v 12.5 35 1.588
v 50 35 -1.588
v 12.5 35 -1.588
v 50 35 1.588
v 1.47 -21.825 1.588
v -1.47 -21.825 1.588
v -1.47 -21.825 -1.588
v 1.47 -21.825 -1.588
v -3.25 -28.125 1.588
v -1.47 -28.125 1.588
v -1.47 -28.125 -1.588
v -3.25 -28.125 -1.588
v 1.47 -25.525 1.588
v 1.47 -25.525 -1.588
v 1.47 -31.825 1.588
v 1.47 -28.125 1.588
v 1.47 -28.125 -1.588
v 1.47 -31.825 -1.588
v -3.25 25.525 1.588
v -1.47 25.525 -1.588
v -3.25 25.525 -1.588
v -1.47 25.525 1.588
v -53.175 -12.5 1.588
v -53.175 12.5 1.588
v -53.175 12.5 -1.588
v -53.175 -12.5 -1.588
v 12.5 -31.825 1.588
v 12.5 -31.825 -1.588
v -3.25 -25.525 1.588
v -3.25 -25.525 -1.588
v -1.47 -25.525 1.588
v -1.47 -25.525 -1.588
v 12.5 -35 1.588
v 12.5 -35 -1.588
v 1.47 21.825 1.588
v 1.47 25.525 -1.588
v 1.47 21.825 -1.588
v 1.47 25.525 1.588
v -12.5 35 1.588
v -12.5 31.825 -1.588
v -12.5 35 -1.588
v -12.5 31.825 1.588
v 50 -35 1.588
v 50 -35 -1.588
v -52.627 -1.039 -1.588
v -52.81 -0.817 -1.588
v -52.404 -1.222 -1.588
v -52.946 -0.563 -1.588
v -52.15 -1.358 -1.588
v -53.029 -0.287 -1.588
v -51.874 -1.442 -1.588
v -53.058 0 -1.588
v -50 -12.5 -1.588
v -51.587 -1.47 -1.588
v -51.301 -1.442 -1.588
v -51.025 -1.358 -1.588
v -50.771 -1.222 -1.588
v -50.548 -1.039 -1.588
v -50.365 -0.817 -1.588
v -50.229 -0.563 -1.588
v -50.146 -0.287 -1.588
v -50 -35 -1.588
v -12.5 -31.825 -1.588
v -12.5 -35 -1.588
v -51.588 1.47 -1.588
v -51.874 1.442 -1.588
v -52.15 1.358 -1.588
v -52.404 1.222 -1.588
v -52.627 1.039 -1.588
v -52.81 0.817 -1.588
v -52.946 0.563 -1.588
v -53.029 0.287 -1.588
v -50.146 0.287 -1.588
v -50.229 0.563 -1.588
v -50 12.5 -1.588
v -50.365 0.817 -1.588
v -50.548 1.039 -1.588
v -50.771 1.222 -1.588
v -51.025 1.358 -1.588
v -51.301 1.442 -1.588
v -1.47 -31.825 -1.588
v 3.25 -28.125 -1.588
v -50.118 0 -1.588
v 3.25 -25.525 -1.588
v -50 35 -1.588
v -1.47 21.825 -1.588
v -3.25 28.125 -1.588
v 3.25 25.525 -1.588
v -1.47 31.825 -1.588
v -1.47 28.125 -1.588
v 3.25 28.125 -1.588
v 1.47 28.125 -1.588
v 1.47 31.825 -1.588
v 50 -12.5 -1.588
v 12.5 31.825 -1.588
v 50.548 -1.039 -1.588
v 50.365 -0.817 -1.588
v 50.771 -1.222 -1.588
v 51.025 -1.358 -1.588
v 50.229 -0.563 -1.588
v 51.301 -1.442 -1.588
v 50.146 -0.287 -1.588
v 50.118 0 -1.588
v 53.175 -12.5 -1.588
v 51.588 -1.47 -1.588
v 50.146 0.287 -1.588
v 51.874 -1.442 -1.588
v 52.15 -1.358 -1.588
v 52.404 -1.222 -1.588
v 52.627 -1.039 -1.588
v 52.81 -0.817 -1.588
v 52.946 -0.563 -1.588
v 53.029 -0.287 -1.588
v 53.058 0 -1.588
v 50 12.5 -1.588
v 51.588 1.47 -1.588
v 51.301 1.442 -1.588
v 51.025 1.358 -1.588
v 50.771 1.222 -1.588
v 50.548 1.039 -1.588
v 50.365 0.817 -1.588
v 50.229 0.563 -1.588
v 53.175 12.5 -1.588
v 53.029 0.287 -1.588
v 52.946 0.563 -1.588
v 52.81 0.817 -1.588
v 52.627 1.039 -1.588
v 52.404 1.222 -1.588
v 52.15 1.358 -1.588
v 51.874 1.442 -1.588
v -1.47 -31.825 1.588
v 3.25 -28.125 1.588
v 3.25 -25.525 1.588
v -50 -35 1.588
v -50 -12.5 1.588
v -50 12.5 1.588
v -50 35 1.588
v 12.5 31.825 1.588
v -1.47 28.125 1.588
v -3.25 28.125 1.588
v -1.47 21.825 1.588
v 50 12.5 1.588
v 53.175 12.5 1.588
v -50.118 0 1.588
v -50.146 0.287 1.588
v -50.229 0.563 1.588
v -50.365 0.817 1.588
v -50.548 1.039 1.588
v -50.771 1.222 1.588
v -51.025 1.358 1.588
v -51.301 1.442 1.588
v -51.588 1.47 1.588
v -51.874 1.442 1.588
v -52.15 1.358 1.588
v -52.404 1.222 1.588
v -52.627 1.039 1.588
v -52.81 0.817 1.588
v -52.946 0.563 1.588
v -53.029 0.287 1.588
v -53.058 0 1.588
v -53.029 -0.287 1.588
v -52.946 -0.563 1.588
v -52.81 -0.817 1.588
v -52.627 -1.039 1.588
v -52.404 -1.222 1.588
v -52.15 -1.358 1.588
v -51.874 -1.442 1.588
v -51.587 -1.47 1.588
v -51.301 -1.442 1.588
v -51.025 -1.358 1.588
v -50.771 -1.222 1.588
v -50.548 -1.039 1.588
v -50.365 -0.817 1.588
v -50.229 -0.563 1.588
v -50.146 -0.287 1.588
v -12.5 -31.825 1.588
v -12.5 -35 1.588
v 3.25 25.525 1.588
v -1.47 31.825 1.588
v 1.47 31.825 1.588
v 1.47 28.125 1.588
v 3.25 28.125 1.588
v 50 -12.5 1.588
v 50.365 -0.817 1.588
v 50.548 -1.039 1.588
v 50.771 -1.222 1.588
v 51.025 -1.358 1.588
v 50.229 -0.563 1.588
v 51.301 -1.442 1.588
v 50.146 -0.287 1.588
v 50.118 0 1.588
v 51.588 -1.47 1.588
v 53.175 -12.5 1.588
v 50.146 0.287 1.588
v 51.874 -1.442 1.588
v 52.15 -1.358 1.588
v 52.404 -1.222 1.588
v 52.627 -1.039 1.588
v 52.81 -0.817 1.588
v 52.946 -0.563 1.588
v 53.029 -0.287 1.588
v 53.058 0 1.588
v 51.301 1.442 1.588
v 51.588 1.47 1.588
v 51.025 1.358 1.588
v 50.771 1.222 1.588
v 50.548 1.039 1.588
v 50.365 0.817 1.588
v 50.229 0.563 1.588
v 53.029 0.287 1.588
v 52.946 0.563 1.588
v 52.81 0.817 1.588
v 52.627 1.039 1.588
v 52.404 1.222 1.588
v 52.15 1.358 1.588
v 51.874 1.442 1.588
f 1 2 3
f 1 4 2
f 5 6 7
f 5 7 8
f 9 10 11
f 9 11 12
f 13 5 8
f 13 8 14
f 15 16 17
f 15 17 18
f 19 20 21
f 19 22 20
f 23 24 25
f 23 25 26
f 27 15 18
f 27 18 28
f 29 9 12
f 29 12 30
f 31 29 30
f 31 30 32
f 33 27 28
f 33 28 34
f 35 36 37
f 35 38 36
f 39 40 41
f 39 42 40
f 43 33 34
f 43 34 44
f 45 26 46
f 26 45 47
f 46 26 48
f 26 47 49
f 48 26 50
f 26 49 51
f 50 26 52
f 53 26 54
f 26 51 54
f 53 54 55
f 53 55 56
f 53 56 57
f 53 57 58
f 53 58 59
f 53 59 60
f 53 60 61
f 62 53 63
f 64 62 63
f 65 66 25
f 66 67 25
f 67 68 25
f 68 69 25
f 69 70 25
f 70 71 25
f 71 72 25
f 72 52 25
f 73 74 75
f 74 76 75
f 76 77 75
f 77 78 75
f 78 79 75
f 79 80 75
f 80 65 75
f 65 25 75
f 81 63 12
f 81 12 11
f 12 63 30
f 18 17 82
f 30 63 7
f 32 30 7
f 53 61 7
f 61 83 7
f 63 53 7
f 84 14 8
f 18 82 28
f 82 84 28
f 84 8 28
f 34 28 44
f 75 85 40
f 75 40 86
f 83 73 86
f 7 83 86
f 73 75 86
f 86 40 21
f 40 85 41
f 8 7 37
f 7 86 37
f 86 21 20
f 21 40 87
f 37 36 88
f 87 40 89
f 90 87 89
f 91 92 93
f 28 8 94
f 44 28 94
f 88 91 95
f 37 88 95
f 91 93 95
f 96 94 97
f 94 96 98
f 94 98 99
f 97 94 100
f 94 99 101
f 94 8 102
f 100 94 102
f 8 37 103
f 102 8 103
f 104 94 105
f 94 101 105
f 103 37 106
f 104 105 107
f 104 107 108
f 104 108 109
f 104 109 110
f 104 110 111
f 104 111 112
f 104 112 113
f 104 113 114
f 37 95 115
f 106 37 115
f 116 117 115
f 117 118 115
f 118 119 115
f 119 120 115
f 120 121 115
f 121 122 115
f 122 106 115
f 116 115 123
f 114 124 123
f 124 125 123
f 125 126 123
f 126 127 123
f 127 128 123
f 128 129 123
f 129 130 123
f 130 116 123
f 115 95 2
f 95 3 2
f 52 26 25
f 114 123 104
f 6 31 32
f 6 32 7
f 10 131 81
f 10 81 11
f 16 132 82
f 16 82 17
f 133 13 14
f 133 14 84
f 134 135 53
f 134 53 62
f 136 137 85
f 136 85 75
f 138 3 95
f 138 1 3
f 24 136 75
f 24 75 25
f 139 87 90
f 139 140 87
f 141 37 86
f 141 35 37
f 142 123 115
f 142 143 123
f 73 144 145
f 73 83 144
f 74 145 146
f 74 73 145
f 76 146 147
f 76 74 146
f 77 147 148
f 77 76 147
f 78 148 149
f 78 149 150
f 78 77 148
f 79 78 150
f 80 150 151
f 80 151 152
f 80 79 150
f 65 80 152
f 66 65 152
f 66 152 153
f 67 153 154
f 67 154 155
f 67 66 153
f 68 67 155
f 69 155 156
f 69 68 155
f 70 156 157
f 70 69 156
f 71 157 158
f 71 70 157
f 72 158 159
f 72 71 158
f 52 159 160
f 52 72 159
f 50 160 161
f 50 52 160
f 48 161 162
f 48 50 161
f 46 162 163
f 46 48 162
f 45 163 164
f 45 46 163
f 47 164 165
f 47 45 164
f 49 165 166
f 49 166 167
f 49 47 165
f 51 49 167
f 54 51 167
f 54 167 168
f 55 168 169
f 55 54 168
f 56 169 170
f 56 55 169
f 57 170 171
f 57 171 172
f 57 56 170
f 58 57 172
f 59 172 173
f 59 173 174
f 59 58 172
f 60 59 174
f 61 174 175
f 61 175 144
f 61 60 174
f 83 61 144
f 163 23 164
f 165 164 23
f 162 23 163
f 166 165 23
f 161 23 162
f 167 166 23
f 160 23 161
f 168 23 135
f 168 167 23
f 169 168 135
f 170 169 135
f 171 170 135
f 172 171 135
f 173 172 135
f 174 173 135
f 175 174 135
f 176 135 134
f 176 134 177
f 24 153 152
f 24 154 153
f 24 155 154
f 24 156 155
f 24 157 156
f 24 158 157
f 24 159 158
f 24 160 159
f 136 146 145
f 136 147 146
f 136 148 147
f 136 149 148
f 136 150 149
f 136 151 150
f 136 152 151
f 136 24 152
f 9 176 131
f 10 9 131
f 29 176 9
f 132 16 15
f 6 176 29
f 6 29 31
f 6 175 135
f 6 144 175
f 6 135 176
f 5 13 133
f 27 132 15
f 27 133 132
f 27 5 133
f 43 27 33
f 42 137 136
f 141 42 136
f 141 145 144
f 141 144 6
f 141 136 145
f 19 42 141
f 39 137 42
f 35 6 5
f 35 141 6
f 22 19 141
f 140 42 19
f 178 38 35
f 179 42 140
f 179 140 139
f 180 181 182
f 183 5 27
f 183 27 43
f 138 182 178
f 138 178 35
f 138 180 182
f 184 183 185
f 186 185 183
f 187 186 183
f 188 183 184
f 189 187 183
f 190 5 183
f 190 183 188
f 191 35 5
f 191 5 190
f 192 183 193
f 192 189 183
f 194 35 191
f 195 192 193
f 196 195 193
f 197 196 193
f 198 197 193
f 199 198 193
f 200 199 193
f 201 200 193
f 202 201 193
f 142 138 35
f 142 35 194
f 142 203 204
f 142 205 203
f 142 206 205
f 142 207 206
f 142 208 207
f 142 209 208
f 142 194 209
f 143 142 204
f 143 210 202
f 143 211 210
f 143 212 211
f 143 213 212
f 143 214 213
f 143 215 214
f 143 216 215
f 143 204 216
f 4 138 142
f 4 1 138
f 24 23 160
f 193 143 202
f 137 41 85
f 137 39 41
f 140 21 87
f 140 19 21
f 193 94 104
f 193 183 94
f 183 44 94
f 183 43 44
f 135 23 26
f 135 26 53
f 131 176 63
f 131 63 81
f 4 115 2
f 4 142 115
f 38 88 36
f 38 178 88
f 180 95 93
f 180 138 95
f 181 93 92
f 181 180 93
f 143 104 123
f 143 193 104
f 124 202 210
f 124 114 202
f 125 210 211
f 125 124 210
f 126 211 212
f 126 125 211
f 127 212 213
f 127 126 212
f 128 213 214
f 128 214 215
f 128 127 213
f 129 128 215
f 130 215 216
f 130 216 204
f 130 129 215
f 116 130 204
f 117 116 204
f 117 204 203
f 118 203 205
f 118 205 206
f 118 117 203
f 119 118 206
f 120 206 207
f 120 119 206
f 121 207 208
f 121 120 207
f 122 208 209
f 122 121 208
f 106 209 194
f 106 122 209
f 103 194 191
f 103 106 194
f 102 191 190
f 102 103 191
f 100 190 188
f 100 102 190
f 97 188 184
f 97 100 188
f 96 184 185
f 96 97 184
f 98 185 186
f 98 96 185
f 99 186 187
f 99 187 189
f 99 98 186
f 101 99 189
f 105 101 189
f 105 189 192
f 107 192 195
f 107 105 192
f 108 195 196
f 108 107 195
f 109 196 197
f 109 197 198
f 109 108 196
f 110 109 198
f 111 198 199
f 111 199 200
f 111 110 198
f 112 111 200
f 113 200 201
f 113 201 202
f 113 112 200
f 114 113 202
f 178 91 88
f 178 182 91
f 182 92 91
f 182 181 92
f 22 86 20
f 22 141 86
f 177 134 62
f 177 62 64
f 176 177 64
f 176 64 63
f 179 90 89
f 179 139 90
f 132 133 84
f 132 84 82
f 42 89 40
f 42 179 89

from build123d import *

# Parameters (mm, degrees)
SKETCH1_R           = 1.47
BOSS_EXTRUDE1_DEPTH = 1.5875


with BuildPart() as part:
    # Sketch1 → Boss-Extrude1 (new body, symmetric)
    with BuildSketch(Plane.XY):
        Polygon((-12.5, 35), (-50, 35), (-50, 12.5), (-53.175, 12.5), (-53.175, -12.5), (-50, -12.5), (-50, -35), (-12.5, -35), (-12.5, -31.825), (-1.47, -31.825), (-1.47, -28.125), (-3.25, -28.125), (-3.25, -25.525), (-1.47, -25.525), (-1.47, -21.825), (1.47, -21.825), (1.47, -25.525), (3.25, -25.525), (3.25, -28.125), (1.47, -28.125), (1.47, -31.825), (12.5, -31.825), (12.5, -35), (50, -35), (50, -12.5), (53.175, -12.5), (53.175, 12.5), (50, 12.5), (50, 35), (12.5, 35), (12.5, 31.825), (1.47, 31.825), (1.47, 28.125), (3.25, 28.125), (3.25, 25.525), (1.47, 25.525), (1.47, 21.825), (-1.47, 21.825), (-1.47, 25.525), (-3.25, 25.525), (-3.25, 28.125), (-1.47, 28.125), (-1.47, 31.825), (-12.5, 31.825), align=None)
        with Locations((-51.5875, 0)):
            Circle(SKETCH1_R, mode=Mode.SUBTRACT)
        with Locations((51.5875, 0)):
            Circle(SKETCH1_R, mode=Mode.SUBTRACT)
    extrude(amount=BOSS_EXTRUDE1_DEPTH, both=True)


solid = part.part
